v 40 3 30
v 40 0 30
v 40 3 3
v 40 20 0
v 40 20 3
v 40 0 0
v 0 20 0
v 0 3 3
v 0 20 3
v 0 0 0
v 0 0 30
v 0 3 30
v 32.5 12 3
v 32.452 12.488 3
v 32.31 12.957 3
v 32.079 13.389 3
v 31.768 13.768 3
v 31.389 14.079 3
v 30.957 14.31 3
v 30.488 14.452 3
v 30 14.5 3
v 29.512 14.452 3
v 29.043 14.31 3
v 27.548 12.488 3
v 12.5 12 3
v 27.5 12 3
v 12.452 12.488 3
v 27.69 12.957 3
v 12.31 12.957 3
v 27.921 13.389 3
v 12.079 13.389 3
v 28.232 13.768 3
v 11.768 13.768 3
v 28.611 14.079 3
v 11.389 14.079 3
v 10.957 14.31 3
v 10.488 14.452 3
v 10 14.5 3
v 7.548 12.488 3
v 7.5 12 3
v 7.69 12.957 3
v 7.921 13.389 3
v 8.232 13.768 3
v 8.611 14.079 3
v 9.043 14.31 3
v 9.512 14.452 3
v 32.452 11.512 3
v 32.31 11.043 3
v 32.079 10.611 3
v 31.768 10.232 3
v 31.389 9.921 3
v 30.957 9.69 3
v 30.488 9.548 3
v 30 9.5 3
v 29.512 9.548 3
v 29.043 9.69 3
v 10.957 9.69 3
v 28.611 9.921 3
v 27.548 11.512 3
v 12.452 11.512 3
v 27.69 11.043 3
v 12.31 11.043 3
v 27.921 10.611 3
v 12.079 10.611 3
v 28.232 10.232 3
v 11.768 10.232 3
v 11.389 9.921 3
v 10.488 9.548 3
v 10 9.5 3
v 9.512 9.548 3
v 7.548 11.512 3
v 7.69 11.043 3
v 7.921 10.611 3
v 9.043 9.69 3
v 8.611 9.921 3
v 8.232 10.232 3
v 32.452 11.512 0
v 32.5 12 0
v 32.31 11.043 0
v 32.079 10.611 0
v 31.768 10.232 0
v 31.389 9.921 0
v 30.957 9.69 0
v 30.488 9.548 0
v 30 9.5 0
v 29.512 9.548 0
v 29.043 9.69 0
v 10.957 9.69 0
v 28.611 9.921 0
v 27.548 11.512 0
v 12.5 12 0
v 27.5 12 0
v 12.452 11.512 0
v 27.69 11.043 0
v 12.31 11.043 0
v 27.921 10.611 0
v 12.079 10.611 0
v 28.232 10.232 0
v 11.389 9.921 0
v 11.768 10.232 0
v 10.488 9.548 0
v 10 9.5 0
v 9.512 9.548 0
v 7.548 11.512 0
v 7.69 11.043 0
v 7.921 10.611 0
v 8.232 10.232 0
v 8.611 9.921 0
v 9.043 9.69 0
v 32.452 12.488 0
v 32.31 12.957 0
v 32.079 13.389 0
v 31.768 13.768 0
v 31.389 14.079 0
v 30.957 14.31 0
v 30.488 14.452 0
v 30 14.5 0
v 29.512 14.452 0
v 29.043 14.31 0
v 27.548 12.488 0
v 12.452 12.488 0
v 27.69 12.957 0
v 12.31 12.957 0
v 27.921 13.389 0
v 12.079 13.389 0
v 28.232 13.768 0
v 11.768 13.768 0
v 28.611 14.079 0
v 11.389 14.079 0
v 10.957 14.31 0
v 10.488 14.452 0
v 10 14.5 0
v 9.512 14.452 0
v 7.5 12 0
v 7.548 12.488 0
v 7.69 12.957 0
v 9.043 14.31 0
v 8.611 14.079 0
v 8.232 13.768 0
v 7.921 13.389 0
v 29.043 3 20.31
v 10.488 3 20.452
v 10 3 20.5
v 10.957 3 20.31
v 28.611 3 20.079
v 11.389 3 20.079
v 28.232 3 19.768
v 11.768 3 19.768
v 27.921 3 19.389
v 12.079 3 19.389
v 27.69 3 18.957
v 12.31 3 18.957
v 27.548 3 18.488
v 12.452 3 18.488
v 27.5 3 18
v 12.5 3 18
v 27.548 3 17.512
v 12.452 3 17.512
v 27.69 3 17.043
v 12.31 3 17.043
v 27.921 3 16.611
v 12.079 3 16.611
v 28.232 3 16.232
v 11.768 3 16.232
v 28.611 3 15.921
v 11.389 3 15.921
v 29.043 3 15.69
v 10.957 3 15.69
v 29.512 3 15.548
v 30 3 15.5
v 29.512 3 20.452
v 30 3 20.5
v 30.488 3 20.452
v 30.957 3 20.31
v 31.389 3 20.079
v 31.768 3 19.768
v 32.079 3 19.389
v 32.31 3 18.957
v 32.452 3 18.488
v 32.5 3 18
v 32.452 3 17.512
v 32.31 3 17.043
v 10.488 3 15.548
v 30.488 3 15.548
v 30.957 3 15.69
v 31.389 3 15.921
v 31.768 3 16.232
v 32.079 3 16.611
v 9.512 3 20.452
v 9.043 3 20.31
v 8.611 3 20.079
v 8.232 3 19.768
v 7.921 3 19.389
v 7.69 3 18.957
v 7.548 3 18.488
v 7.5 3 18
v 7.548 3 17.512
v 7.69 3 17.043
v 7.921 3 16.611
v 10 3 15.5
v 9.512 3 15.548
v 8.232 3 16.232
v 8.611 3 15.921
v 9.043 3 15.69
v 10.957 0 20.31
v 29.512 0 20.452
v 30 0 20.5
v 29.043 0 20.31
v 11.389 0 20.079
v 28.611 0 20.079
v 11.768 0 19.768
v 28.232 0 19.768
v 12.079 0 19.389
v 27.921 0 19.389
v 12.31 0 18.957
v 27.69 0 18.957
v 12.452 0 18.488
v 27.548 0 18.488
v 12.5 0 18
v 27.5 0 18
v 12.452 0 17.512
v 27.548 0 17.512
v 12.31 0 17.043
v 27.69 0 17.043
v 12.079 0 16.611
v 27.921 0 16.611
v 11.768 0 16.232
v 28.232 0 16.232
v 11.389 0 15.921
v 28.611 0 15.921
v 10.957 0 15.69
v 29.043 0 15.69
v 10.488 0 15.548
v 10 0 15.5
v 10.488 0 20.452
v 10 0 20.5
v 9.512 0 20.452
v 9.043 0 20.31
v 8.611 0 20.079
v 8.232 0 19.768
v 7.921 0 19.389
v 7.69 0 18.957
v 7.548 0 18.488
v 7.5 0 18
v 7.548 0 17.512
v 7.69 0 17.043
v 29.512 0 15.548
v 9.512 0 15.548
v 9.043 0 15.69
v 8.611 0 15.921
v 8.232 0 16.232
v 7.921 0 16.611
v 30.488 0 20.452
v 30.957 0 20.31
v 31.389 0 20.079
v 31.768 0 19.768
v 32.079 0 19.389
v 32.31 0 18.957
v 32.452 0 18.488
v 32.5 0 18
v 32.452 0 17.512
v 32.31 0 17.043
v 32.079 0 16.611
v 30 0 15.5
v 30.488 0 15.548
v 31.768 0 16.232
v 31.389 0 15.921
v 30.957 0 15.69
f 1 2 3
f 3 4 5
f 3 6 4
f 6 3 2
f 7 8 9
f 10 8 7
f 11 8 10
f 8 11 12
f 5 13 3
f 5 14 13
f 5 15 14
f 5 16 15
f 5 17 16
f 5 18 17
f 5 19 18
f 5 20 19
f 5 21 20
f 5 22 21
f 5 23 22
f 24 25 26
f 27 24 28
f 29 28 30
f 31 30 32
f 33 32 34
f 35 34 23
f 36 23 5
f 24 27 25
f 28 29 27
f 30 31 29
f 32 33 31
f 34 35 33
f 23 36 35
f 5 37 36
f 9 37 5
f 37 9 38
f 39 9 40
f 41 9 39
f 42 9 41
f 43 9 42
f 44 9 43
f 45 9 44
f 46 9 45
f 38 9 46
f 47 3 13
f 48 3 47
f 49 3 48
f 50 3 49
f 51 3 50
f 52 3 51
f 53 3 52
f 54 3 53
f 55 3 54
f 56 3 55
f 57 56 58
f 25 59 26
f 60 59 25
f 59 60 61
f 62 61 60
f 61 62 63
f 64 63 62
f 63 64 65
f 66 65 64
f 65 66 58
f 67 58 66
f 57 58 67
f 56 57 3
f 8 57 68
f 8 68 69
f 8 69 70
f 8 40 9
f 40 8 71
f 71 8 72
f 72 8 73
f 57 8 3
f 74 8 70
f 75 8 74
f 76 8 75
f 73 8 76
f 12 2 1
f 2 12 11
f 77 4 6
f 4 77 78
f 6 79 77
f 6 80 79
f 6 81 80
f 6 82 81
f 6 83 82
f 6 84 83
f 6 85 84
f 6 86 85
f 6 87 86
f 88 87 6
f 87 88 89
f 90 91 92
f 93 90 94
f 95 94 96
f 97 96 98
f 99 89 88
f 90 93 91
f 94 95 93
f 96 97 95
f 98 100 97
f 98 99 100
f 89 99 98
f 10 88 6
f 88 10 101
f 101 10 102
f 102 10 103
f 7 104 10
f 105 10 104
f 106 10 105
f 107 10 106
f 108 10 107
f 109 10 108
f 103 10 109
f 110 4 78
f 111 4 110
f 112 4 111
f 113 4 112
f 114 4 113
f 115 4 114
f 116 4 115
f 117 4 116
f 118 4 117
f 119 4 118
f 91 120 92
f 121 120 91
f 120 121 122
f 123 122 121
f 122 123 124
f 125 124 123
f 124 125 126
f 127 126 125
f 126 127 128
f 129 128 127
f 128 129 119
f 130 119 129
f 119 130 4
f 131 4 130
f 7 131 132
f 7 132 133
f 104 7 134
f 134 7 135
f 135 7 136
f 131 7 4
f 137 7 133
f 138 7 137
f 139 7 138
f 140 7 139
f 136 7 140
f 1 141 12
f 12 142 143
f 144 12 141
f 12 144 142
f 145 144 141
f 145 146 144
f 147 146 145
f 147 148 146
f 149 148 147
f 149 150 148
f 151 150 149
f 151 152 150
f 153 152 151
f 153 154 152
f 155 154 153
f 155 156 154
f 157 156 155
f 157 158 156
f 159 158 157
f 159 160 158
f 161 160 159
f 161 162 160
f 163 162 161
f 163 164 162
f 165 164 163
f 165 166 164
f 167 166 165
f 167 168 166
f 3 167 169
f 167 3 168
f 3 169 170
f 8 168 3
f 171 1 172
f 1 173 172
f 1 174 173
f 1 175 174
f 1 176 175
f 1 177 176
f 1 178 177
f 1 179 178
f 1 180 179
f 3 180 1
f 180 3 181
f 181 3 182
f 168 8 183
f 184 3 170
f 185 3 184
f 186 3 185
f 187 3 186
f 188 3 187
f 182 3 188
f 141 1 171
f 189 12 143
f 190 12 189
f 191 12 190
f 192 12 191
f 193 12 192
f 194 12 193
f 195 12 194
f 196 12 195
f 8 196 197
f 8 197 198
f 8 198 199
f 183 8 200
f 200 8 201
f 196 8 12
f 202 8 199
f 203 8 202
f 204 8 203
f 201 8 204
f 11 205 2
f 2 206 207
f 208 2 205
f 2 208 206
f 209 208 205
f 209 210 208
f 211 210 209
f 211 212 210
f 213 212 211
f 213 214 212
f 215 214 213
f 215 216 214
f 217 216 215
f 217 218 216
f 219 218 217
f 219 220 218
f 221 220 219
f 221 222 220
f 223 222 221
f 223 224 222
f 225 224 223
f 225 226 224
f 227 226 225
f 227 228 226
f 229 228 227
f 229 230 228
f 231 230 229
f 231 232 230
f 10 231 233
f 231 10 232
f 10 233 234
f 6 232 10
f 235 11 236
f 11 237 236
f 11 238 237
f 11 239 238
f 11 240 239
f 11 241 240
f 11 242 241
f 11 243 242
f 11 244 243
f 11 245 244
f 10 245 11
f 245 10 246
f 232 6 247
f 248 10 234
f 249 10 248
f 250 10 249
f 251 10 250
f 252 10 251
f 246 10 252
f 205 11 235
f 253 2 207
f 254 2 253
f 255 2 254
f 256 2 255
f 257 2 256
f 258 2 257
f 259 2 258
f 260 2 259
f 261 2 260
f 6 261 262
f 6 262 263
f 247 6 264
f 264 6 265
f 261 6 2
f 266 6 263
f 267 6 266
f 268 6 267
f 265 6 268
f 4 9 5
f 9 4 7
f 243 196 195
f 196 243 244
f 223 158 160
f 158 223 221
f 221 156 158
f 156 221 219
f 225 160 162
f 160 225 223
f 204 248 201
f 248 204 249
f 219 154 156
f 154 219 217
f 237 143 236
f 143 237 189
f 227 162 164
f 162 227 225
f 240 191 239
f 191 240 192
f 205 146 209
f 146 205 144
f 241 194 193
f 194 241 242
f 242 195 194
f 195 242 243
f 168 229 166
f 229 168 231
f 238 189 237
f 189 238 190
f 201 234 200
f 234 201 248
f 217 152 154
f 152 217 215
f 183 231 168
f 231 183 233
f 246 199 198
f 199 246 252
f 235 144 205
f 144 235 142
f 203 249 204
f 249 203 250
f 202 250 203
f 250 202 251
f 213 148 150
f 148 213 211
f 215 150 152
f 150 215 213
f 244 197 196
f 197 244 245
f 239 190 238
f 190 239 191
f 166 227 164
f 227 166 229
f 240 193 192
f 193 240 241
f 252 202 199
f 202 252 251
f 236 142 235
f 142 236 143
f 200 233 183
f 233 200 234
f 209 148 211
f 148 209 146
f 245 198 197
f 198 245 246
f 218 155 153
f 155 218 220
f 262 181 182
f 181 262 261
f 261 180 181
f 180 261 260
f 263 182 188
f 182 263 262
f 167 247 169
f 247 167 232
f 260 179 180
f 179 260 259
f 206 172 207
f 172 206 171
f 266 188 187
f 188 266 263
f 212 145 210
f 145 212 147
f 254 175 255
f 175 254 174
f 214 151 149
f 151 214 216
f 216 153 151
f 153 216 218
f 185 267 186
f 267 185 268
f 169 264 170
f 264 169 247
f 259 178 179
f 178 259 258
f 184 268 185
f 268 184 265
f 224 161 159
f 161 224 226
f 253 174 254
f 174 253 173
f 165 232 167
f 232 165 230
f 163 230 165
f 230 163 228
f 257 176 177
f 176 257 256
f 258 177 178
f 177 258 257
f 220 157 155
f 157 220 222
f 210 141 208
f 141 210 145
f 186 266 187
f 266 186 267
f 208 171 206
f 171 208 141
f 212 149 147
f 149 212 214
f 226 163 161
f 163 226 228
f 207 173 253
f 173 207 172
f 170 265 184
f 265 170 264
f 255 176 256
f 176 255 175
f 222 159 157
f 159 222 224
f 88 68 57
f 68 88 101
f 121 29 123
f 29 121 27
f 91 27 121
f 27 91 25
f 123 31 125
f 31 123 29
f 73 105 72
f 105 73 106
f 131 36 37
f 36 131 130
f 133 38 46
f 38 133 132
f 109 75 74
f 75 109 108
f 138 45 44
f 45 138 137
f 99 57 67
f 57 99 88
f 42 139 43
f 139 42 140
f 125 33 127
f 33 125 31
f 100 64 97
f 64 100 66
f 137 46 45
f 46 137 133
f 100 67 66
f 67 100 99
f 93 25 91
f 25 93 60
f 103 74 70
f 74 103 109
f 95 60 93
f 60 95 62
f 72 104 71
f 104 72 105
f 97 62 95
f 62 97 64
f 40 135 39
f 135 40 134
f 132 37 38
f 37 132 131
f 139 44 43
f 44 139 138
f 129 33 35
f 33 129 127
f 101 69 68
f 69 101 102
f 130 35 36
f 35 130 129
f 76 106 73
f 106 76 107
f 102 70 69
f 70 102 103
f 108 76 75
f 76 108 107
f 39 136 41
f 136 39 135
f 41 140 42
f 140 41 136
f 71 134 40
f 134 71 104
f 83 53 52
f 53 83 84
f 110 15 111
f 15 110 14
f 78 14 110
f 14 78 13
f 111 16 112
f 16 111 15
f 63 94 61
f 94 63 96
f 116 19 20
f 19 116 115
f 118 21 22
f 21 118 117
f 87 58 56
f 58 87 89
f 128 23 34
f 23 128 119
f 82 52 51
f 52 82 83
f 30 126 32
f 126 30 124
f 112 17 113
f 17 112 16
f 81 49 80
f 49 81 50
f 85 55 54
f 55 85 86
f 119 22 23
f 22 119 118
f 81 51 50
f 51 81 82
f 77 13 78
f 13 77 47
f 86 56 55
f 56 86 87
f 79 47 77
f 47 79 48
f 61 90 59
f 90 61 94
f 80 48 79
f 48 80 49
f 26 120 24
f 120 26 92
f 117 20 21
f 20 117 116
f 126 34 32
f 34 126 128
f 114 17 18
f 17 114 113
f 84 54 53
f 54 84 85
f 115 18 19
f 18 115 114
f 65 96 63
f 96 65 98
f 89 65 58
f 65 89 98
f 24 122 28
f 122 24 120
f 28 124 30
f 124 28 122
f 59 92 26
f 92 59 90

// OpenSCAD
// file: ../lib/validate.scad
// validate.scad — Layer 1 parameter validation library
// Pattern: assert() gates with GATE FAIL: prefix for grep-able error extraction
// Usage: include <lib/validate.scad> then call validate_* modules

// Validate a numeric parameter is within bounds
// Fails with GATE FAIL: prefix and interpolated values
module validate_range(name, value, min_val, max_val) {
    assert(value >= min_val,
        str("GATE FAIL: ", name, "=", value, " < ", min_val, " minimum"));
    assert(value <= max_val,
        str("GATE FAIL: ", name, "=", value, " > ", max_val, " maximum"));
}

// Validate a dimension is positive
module validate_positive(name, value) {
    assert(value > 0,
        str("GATE FAIL: ", name, "=", value, " must be positive"));
}

// Validate wall thickness meets printability minimum
module validate_wall_thickness(name, value, min_wall=0.8) {
    assert(value >= min_wall,
        str("GATE FAIL: ", name, "=", value, "mm < ", min_wall, "mm minimum wall thickness"));
}

// Validate $fn is reasonable for printable curves
module validate_fn(fn_val, min_fn=16, max_fn=256) {
    assert(fn_val >= min_fn,
        str("GATE FAIL: $fn=", fn_val, " < ", min_fn, " (too coarse for printable curves)"));
    assert(fn_val <= max_fn,
        str("GATE FAIL: $fn=", fn_val, " > ", max_fn, " (excessive polygon count)"));
}

// Validate hole diameter is printable
module validate_hole(name, diameter, min_diameter=1.0) {
    assert(diameter >= min_diameter,
        str("GATE FAIL: ", name, "=", diameter, "mm < ", min_diameter, "mm minimum hole diameter"));
}

// Validate that interior space exists (wall doesn't consume entire dimension)
module validate_interior(dim_name, dim_value, wall_name, wall_value) {
    assert(wall_value < dim_value / 2,
        str("GATE FAIL: ", wall_name, "=", wall_value,
            " >= ", dim_name, "/2=", dim_value/2, " (no interior space)"));
}

// Batch validate common bracket/enclosure parameters
// This is the recommended entry point for simple parts
module validate_part(width, height, depth, wall_thickness,
                     fn=32, holes=[], min_wall=0.8) {
    validate_positive("width", width);
    validate_positive("height", height);
    validate_positive("depth", depth);
    validate_wall_thickness("wall_thickness", wall_thickness, min_wall);
    validate_fn(fn);
    validate_interior("width", width, "wall_thickness", wall_thickness);
    validate_interior("depth", depth, "wall_thickness", wall_thickness);

    // Validate each hole diameter if provided
    for (i = [0:len(holes)-1]) {
        validate_hole(str("hole[", i, "]"), holes[i]);
    }
}
// main file
// bracket.scad — Sample parametric L-bracket with Layer 1 assert gates
// Demonstrates: parameter validation, GATE FAIL pattern, -D flag overrides

// --- Parameters (override via -D flags) ---
width = 40;           // mm
height = 30;          // mm
depth = 20;           // mm
wall_thickness = 3;   // mm (minimum 0.8mm for FDM)
hole_diameter = 5;    // mm (mounting holes)
fillet_radius = 2;    // mm (edge fillets)
fn = 32;              // facet count for curves

// --- Layer 1: Parameter Validation ---
use <../lib/validate.scad>

validate_part(width, height, depth, wall_thickness, fn,
              holes=[hole_diameter]);
validate_range("fillet_radius", fillet_radius, 0, min(wall_thickness, 5));
validate_positive("hole_diameter", hole_diameter);

// Advisory warnings (non-blocking, echo to stderr)
if (wall_thickness < 1.2)
    echo("WARN: wall_thickness=", wall_thickness, "mm is thin for structural parts");
if (fn > 128)
    echo("WARN: $fn=", fn, " will produce high polygon count");

// --- Geometry ---
module bracket() {
    difference() {
        union() {
            // Vertical plate
            cube([width, wall_thickness, height]);
            // Horizontal plate
            cube([width, depth, wall_thickness]);
            // Fillet (structural reinforcement)
            if (fillet_radius > 0) {
                translate([0, wall_thickness, wall_thickness])
                    rotate([0, 90, 0])
                        difference() {
                            cube([fillet_radius, fillet_radius, width]);
                            translate([fillet_radius, fillet_radius, -1])
                                cylinder(r=fillet_radius, h=width+2, $fn=fn);
                        }
            }
        }

        // Mounting holes in vertical plate
        for (x = [width * 0.25, width * 0.75]) {
            translate([x, -1, height * 0.6])
                rotate([-90, 0, 0])
                    cylinder(d=hole_diameter, h=wall_thickness+2, $fn=fn);
        }

        // Mounting holes in horizontal plate
        for (x = [width * 0.25, width * 0.75]) {
            translate([x, depth * 0.6, -1])
                cylinder(d=hole_diameter, h=wall_thickness+2, $fn=fn);
        }
    }
}

bracket();
